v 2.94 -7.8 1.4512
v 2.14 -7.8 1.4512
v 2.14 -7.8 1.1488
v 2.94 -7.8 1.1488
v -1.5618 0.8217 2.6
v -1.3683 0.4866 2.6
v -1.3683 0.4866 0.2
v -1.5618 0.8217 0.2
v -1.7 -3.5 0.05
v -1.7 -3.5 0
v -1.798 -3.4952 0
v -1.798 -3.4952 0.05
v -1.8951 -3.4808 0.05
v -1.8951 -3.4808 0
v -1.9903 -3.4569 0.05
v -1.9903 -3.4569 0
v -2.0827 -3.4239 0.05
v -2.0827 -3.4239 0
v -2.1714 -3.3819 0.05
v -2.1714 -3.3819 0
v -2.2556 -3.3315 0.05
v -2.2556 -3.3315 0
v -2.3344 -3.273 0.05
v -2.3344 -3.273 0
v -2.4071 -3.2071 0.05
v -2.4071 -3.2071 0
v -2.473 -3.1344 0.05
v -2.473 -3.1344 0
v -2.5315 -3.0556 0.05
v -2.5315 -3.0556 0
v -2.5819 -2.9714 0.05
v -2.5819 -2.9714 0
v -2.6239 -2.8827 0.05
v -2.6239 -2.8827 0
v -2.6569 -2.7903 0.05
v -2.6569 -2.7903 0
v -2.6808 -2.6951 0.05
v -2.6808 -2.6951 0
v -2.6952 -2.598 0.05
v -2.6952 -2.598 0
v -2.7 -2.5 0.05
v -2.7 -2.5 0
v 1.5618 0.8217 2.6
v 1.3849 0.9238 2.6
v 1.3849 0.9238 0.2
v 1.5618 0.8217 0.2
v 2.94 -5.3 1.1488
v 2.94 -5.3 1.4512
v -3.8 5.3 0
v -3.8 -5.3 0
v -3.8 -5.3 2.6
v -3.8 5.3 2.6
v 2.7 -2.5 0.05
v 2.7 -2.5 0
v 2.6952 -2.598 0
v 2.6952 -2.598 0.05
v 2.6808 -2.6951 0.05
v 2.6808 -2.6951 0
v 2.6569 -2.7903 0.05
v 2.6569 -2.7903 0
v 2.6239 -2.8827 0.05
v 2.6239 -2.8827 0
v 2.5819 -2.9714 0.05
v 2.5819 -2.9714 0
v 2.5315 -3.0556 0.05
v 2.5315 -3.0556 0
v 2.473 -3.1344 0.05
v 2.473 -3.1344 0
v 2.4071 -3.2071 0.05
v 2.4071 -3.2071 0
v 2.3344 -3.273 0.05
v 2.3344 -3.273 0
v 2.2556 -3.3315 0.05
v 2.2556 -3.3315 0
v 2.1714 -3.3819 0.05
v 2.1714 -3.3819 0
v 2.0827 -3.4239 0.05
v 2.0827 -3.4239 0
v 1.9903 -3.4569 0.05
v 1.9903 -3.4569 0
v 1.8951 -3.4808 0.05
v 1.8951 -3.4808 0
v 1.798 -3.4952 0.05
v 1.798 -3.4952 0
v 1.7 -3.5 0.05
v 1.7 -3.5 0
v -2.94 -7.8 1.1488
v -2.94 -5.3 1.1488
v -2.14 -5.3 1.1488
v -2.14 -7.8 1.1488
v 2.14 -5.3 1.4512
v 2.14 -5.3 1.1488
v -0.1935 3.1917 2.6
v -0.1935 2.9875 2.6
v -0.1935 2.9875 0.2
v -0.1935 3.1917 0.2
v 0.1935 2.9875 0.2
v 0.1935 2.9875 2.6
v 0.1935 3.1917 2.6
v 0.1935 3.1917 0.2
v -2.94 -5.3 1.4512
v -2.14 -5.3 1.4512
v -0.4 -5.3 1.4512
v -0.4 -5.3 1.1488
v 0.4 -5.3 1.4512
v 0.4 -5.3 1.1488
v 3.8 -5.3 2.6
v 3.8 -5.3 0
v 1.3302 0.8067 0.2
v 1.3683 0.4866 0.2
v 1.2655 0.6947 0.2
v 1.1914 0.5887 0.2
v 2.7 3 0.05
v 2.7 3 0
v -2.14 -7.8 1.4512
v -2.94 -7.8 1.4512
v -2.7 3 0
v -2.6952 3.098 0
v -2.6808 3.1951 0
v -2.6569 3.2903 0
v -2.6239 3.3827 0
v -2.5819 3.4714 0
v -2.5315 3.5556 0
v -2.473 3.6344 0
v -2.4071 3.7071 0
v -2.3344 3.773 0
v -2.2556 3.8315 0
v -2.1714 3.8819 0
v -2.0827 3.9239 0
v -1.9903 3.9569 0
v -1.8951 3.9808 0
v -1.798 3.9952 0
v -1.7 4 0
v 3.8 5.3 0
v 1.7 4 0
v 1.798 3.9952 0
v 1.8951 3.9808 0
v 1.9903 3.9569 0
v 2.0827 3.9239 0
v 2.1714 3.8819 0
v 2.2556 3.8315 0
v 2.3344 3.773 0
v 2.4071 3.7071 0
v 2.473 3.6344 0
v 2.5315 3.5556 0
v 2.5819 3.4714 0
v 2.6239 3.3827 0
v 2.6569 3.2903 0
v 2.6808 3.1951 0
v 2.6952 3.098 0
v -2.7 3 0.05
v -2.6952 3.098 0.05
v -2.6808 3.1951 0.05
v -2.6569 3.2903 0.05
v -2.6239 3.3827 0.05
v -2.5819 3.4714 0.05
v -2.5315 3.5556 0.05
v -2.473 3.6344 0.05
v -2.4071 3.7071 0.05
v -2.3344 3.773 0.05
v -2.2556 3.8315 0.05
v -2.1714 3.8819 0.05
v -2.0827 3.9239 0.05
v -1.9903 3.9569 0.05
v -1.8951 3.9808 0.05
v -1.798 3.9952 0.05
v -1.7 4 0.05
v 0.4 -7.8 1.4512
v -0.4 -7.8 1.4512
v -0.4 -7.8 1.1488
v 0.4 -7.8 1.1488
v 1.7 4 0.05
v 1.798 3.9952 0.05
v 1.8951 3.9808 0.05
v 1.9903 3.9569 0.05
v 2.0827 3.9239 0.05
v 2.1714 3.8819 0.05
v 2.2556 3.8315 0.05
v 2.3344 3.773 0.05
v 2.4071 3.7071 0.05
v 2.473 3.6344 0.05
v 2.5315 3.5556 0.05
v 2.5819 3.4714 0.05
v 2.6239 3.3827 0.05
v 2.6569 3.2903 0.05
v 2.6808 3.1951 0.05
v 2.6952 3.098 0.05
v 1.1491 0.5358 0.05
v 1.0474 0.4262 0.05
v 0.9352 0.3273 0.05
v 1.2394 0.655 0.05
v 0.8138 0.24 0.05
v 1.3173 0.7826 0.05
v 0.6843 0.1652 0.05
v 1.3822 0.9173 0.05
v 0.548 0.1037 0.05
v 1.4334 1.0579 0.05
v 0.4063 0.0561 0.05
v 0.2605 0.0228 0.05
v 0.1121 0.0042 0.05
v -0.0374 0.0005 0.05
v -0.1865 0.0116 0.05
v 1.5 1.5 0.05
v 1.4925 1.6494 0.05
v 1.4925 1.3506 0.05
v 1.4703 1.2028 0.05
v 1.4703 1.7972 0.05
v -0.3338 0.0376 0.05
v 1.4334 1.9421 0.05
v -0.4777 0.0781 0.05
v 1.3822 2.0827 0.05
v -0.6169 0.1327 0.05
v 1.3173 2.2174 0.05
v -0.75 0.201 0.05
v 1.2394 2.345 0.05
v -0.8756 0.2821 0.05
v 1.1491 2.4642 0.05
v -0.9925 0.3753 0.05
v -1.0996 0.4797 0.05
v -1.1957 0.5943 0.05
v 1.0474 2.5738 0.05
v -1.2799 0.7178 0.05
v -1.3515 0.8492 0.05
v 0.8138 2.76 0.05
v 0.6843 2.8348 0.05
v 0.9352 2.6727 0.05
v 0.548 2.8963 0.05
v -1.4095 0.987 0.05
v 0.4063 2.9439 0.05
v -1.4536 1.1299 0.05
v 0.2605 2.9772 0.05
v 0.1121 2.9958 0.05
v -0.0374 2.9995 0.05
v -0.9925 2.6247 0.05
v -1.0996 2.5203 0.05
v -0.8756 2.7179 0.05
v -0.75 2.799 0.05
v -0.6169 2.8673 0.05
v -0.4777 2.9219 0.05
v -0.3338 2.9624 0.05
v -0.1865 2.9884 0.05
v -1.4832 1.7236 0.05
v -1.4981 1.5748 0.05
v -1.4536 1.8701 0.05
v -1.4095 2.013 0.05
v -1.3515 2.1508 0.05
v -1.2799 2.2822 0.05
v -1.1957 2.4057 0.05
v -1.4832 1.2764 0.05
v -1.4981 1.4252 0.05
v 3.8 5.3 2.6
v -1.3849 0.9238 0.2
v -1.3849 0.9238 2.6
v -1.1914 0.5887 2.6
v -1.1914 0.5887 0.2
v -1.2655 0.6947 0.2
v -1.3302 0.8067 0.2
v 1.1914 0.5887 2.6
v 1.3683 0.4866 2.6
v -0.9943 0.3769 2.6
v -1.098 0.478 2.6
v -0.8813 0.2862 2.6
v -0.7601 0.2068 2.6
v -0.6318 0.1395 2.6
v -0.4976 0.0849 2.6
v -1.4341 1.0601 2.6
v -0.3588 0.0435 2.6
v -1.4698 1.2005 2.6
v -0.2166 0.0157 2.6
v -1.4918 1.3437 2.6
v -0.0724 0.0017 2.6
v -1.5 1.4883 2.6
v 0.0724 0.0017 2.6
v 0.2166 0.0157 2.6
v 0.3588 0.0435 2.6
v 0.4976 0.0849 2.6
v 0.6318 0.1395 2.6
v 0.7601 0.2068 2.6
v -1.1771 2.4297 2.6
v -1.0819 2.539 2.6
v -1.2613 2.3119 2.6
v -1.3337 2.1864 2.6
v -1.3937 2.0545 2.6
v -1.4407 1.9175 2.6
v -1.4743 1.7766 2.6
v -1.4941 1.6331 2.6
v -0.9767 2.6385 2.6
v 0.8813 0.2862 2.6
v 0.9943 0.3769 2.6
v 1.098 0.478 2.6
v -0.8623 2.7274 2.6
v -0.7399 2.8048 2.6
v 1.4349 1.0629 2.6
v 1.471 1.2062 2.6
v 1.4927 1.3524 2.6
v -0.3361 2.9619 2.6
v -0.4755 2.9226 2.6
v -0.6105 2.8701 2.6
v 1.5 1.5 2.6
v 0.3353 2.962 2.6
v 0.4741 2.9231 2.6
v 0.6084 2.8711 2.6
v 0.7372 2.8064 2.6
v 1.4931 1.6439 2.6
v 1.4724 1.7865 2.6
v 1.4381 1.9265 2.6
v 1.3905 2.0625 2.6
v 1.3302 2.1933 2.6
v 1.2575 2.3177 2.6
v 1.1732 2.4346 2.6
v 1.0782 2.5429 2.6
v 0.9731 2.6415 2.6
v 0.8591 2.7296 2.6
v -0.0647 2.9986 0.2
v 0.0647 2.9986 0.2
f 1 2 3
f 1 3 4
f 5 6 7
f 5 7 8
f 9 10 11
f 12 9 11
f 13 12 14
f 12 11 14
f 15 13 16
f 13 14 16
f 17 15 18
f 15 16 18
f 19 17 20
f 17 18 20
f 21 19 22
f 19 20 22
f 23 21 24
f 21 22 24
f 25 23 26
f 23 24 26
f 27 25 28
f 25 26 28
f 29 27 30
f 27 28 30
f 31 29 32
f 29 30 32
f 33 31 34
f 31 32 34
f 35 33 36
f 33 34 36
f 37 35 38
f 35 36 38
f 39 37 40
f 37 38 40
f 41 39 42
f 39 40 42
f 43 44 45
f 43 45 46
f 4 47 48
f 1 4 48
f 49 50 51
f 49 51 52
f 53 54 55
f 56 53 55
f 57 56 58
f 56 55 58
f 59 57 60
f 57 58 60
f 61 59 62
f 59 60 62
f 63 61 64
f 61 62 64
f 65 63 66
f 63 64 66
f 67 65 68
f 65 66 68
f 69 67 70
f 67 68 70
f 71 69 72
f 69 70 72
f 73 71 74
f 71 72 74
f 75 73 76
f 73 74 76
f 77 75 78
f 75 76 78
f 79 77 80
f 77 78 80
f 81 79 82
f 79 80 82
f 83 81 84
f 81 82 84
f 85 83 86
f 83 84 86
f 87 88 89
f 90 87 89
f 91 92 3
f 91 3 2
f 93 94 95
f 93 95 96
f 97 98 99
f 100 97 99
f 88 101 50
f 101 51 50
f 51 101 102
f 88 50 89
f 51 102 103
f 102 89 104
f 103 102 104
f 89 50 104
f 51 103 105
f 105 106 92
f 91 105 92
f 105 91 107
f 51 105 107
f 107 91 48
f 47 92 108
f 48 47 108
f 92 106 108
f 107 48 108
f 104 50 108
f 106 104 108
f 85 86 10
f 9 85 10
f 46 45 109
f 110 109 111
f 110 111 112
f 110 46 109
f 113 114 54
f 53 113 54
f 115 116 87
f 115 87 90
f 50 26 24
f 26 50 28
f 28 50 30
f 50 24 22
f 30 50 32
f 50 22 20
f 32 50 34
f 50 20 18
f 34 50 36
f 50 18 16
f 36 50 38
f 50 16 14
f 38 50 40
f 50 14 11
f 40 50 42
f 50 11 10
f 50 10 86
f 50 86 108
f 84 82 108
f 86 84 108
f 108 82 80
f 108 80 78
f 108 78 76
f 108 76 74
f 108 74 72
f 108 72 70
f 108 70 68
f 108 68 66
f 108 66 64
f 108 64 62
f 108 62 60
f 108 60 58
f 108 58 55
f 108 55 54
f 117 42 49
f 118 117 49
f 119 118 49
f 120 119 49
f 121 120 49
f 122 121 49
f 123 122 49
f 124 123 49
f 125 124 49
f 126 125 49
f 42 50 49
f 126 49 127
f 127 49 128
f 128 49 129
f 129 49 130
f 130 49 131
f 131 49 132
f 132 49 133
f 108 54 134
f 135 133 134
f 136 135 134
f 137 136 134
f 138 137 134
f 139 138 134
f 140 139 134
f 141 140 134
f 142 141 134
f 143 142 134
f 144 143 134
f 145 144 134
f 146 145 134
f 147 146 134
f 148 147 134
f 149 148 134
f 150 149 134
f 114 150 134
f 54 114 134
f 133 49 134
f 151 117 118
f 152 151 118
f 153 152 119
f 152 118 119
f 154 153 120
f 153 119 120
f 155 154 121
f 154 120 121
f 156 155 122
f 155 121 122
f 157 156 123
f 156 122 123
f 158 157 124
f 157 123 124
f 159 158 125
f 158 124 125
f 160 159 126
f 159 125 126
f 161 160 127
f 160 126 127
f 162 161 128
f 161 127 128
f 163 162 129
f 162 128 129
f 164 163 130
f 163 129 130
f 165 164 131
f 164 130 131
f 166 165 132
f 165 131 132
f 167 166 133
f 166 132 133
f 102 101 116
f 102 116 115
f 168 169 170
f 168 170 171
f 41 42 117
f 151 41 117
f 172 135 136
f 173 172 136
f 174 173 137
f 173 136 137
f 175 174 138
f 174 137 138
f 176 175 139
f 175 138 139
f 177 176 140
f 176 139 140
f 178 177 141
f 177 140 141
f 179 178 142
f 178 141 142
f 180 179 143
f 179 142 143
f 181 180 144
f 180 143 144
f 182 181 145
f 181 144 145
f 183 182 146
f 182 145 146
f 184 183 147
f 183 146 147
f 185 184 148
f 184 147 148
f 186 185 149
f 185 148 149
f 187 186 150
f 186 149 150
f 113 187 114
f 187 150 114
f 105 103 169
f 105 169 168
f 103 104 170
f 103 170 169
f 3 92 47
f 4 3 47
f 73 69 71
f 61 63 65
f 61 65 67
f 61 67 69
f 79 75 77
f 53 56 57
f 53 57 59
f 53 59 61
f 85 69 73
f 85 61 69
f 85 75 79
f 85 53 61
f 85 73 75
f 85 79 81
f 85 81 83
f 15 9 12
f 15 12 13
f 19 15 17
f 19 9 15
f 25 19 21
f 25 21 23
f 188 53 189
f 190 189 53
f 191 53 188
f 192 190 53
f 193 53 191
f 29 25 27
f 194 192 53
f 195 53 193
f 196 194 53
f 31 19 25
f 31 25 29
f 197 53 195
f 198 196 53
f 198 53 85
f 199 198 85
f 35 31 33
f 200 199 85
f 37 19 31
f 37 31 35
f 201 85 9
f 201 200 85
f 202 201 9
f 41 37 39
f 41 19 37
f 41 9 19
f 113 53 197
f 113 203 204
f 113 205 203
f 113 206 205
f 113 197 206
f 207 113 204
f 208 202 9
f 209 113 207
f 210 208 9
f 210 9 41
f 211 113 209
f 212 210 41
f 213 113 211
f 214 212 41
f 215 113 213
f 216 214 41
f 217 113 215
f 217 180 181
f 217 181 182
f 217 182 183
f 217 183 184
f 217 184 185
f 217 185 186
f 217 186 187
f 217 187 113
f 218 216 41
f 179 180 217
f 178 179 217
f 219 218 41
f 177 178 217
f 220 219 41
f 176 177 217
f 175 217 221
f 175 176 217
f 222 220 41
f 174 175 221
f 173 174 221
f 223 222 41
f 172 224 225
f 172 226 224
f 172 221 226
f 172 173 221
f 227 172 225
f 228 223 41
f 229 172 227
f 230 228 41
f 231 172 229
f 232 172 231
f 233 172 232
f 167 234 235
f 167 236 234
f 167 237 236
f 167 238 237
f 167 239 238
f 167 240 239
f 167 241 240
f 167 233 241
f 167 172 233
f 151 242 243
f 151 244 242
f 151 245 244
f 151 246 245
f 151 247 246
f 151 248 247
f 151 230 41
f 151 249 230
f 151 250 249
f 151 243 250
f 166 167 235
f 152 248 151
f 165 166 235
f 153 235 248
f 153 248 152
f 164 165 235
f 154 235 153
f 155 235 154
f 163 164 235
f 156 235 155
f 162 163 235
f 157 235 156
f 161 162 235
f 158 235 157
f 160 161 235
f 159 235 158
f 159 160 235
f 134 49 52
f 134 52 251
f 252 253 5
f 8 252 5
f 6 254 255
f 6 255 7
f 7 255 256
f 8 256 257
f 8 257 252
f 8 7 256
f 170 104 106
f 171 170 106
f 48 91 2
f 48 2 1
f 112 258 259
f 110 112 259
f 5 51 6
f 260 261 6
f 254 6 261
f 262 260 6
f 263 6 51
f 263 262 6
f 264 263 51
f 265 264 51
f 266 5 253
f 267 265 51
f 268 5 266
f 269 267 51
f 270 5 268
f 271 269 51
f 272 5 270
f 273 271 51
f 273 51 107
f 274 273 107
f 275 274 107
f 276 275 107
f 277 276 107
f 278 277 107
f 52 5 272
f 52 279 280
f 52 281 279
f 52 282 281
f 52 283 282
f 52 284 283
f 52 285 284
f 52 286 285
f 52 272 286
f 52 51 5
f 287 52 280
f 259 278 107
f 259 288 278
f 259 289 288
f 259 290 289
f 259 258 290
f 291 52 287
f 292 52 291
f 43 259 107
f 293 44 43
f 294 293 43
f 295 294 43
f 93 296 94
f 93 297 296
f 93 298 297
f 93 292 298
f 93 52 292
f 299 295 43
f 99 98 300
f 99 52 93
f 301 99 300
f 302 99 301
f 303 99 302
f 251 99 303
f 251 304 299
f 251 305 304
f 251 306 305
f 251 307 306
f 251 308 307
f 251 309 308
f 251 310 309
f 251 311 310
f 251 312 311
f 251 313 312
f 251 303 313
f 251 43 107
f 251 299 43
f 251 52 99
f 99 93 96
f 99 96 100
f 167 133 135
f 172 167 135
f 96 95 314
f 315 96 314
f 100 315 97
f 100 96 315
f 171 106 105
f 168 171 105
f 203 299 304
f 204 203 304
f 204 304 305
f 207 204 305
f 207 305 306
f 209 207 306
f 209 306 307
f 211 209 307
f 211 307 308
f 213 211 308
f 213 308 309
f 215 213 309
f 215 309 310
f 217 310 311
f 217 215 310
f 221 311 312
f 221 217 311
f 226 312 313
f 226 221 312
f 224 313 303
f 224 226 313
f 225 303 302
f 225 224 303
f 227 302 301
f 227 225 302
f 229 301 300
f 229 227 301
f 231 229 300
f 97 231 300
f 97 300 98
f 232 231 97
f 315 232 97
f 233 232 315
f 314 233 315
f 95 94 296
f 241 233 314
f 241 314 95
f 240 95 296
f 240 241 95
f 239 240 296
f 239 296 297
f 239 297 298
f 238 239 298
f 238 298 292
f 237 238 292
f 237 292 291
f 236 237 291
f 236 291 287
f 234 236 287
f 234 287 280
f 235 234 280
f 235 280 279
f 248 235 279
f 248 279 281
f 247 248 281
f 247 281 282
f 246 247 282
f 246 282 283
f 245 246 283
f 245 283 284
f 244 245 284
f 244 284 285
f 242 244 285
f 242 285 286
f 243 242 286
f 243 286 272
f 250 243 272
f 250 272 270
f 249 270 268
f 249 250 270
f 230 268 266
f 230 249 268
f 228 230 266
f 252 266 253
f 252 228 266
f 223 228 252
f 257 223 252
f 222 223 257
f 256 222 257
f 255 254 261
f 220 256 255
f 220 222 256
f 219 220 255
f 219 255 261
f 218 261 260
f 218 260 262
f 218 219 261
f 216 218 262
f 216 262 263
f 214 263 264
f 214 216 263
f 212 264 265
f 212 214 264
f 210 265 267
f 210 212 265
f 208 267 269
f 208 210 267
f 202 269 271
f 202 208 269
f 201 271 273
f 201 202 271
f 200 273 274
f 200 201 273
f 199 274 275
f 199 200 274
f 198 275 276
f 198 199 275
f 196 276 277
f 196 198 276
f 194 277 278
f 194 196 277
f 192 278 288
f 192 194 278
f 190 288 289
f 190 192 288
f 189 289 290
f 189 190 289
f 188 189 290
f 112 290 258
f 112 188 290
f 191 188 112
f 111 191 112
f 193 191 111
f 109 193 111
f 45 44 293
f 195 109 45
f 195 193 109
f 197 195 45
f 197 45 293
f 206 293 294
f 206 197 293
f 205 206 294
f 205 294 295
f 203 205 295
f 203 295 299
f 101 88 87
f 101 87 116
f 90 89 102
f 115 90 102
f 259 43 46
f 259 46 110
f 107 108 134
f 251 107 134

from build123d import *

# Parameters (mm, degrees)
ESBO_O1_W                = 7.6
ESBO_O1_H                = 10.6
ESBO_O1_R                = 1.5
RESSALTO_EXTRUS_O1_DEPTH = 2.6
ESBO_O2_W                = 0.386988846
ESBO_O2_H                = 1.141626943
CORTE_EXTRUS_O1_DEPTH    = 2.4
PADR_OCIRCULAR1_COUNT    = 3
CORTE_EXTRUS_O2_DEPTH    = 0.05
ESBO_O4_W                = 0.8
ESBO_O4_H                = 0.302387696
RESSALTO_EXTRUS_O2_DEPTH = 2.5


with BuildPart() as part:
    # Esboço1 → Ressalto-extrusão1 (new body)
    with BuildSketch(Plane.XY):
        Rectangle(ESBO_O1_W, ESBO_O1_H)
        with Locations((0, 1.5)):
            Circle(ESBO_O1_R, mode=Mode.SUBTRACT)
    extrude(amount=RESSALTO_EXTRUS_O1_DEPTH)

    # Esboço2 → Corte-extrusão1 (cut)
    with BuildSketch(Plane.XY.offset(2.6)):
        with Locations((0, 2.620892828)):
            Rectangle(ESBO_O2_W, ESBO_O2_H)
    corte_extrus_o1 = extrude(amount=-CORTE_EXTRUS_O1_DEPTH, mode=Mode.SUBTRACT)

    # PadrãoCircular1: Corte-extrusão1 ×3 about axis
    padr_ocircular1_axis = Axis((0, 1.5, 0), (0, 0, 1))
    for i in range(1, PADR_OCIRCULAR1_COUNT):
        add(corte_extrus_o1.rotate(padr_ocircular1_axis, i * 360 / PADR_OCIRCULAR1_COUNT), mode=Mode.SUBTRACT)

    # Esboço3 → Corte-extrusão2 (cut)
    with BuildSketch(Plane(origin=(0, 0, 0), x_dir=(-1, 0, 0), z_dir=(0, 0, -1))):
        with BuildLine():
            Line((-1.7, -3.5), (1.7, -3.5))
            ThreePointArc((1.7, -3.5), (2.407106781, -3.207106781), (2.7, -2.5))
            Line((2.7, -2.5), (2.7, 3))
            ThreePointArc((2.7, 3), (2.407106781, 3.707106781), (1.7, 4))
            Line((1.7, 4), (-1.7, 4))
            ThreePointArc((-1.7, 4), (-2.407106781, 3.707106781), (-2.7, 3))
            Line((-2.7, 3), (-2.7, -2.5))
            ThreePointArc((-2.7, -2.5), (-2.407106781, -3.207106781), (-1.7, -3.5))
        make_face()
    extrude(amount=-CORTE_EXTRUS_O2_DEPTH, mode=Mode.SUBTRACT)

    # Esboço4 → Ressalto-extrusão2 (add)
    with BuildSketch(Plane.XZ.offset(5.3)):
        with Locations((-2.54, 1.3)):
            Rectangle(ESBO_O4_W, ESBO_O4_H)
        with Locations((0, 1.3)):
            Rectangle(ESBO_O4_W, ESBO_O4_H)
        with Locations((2.54, 1.3)):
            Rectangle(ESBO_O4_W, ESBO_O4_H)
    extrude(amount=RESSALTO_EXTRUS_O2_DEPTH)


solid = part.part
